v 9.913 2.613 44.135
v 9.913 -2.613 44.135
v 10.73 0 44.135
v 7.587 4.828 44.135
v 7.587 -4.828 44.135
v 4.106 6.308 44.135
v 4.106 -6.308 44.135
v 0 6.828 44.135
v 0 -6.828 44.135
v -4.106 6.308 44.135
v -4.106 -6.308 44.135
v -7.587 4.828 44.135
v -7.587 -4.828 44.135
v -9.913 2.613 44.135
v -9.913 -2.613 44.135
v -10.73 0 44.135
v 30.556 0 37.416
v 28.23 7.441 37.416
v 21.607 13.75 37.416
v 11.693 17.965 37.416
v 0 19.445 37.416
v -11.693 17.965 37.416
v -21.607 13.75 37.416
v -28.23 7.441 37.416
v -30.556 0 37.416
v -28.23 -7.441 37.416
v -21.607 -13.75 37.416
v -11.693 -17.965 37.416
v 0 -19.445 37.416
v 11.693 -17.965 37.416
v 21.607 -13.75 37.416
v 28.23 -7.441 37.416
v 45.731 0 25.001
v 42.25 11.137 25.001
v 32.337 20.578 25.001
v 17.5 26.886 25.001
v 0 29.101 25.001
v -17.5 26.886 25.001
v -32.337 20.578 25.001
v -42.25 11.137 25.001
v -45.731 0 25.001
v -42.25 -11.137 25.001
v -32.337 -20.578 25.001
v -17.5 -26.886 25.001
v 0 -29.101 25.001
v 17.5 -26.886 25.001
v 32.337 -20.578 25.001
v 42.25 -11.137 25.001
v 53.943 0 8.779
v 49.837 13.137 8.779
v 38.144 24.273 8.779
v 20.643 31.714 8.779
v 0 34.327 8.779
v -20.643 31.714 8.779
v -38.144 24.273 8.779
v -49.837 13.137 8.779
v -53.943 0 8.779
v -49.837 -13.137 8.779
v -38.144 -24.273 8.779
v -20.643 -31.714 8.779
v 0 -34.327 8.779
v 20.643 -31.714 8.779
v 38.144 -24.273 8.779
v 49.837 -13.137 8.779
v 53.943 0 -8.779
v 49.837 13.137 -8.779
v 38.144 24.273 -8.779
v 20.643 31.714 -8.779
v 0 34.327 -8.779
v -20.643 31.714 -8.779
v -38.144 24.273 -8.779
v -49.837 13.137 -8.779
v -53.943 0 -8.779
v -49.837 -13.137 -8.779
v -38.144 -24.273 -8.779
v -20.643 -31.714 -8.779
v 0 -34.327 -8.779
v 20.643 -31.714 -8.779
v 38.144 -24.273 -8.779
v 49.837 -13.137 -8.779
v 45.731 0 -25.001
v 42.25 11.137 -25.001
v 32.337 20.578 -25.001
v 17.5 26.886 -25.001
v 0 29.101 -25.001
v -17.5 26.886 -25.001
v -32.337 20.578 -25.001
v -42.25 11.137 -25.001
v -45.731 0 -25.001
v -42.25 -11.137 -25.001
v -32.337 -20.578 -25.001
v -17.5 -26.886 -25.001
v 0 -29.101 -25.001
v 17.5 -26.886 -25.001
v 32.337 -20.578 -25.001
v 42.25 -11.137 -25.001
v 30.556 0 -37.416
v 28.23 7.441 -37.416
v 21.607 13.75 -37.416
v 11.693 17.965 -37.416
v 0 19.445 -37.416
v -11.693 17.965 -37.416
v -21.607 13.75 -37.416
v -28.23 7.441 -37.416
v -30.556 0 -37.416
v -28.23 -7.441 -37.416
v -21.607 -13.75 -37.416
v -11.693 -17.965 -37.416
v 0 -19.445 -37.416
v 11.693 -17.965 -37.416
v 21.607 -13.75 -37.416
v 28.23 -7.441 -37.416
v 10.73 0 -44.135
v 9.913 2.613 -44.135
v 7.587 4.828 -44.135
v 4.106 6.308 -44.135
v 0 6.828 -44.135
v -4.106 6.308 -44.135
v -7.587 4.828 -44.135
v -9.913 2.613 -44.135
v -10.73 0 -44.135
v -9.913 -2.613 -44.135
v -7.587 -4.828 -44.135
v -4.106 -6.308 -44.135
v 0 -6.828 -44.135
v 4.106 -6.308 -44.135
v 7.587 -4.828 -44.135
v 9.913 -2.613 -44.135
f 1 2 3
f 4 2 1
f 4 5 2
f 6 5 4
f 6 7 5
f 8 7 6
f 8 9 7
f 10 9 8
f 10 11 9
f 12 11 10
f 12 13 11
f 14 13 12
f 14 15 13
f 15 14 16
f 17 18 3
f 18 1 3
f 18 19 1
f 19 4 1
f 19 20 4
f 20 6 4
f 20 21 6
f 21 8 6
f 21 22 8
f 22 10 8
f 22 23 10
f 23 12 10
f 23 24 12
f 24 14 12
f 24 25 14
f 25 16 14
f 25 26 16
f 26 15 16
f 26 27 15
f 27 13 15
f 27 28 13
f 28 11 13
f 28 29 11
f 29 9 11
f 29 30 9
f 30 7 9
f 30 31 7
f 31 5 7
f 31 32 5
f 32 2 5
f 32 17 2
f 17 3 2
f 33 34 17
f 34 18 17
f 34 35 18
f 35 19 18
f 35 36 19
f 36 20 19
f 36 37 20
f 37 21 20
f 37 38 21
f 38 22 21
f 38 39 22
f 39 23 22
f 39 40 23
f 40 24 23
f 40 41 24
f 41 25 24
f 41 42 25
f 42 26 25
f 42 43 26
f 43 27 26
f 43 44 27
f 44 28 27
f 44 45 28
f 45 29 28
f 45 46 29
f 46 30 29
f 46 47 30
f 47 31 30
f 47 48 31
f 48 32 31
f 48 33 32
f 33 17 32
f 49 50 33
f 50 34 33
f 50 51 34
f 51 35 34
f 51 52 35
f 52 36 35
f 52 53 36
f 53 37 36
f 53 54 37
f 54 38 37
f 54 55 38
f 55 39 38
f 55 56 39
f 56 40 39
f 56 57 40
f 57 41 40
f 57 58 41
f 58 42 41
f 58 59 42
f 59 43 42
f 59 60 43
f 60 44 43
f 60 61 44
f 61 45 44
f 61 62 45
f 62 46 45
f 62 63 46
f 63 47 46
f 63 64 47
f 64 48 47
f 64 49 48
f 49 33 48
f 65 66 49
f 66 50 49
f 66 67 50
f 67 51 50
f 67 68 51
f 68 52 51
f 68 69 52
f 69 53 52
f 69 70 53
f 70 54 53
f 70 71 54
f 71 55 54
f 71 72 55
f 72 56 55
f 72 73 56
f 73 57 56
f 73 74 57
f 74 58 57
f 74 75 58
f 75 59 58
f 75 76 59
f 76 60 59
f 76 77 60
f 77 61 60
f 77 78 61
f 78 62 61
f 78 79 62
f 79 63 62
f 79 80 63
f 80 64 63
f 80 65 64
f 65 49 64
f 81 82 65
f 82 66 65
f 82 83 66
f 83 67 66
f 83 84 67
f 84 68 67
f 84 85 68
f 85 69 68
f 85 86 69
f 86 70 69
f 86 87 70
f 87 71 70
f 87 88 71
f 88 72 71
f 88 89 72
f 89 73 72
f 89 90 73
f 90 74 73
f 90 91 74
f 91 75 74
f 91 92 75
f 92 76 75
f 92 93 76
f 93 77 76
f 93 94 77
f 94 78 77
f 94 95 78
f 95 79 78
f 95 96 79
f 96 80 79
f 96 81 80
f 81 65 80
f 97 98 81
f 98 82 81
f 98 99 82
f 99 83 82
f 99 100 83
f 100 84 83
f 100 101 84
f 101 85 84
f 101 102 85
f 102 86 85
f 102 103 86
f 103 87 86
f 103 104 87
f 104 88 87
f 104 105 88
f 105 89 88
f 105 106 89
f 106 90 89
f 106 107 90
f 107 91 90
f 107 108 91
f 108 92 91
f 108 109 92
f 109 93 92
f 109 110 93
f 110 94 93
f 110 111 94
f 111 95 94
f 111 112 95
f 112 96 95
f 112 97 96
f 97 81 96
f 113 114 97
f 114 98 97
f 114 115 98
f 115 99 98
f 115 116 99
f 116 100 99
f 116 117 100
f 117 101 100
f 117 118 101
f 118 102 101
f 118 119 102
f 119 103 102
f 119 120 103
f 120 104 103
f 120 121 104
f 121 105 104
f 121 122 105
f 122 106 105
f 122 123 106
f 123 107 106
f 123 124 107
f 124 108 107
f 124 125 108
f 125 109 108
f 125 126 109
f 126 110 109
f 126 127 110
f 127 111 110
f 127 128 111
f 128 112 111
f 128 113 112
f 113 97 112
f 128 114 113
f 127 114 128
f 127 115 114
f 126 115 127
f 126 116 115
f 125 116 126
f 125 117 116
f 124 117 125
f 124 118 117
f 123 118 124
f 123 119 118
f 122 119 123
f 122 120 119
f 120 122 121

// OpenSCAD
// Generated by SolidPython 1.0.1 on 2020-07-29 00:46:49


scale(v = [11, 7, 9]) {
	sphere(r = 5);
}
/***********************************************
*********      SolidPython code:      **********
************************************************
 
# import packages: SolidPython
from solid import *
from solid.utils import *
from itertools import chain, combinations, permutations


class Resize:

    def __init__(self, scad_file):
        self.scad_file = scad_file
        #self.scad_file = import_scad(scad_file)
        # cone/cylinder param:
        self.r1 = 0
        self.r2 = 0
        self.h = 0
        # rectangular prism param:
        self.w = 0
        self.l = 0
        # ellipse param:
        self.r = 0

    # import OpenScad code (file name corresponds to shape)


    # classify shape + parameters
    def assign(self, param1, param2, param3):
        if self.scad_file == 'cone.scad':
            self.r1 = param1
            self.r2 = param2
            self.h = param3
        elif self.scad_file == 'cylinder.scad':
            self.r1 = param1
            self.r2 = param2
            self.h = param3
        elif self.scad_file == 'rectangularPrism.scad':
            self.h = param1
            self.l = param2
            self.w = param3
        else:
            self.r = param1
            self.h = param2

    # resize parameters
    def iterate(self):
        x = range(3, 20, 2)
        i = 1
        if self.scad_file == 'cone.scad':
            tempList = list(permutations(x, 2))
            for temp in tempList:
                param1 = temp[0]
                param2 = temp[1]
                filepath = 'produced_scad_files/' + 'cone' + str(param1) + '_' + str(param2) + '_' + '.scad'
                scad_render_to_file(cylinder(h=param1, r1=param2, r2=0), filepath)

        elif self.scad_file == 'cylinder.scad':
            tempList = list(permutations(x, 3))
            for temp in tempList:
                param1 = temp[0]
                param2 = temp[1]
                filepath = 'produced_scad_files/' + 'cylinder' + str(param1) + '_' + str(param2) + '_' + '.scad'
                scad_render_to_file(cylinder(h=param1, r1=param2, r2=param2), filepath)

        elif self.scad_file == 'rectangularPrism.scad':
            tempList = list(permutations(x, 3))
            for temp in tempList:
                param1 = temp[0]
                param2 = temp[1]
                param3 = temp[2]
                filepath = 'produced_scad_files/' + 'rectangularPrism' + str(param1) + '_' + str(param2) + '_' + str(
                    param3) + '.scad'
                scad_render_to_file(cube(size=(param1, param2, param3)), filepath)

        elif self.scad_file == 'ellipse.scad':
            tempList = list(permutations(x, 4))
            for temp in tempList:
                param1 = temp[0]
                param2 = temp[1]
                param3 = temp[2]
                param4 = temp[3]
                filepath = 'produced_scad_files/' + 'ellipse' + str(param1) + '_' + str(param2) + '_' + str(param3) + '_' + str(param4) + '.scad'
                scad_render_to_file(scale([param1, param2, param3])(sphere(r=param4)), filepath)

    def render_to_scadfile(self):
        scad_render_to_file(scad, 'example.scad') 
 
************************************************/
